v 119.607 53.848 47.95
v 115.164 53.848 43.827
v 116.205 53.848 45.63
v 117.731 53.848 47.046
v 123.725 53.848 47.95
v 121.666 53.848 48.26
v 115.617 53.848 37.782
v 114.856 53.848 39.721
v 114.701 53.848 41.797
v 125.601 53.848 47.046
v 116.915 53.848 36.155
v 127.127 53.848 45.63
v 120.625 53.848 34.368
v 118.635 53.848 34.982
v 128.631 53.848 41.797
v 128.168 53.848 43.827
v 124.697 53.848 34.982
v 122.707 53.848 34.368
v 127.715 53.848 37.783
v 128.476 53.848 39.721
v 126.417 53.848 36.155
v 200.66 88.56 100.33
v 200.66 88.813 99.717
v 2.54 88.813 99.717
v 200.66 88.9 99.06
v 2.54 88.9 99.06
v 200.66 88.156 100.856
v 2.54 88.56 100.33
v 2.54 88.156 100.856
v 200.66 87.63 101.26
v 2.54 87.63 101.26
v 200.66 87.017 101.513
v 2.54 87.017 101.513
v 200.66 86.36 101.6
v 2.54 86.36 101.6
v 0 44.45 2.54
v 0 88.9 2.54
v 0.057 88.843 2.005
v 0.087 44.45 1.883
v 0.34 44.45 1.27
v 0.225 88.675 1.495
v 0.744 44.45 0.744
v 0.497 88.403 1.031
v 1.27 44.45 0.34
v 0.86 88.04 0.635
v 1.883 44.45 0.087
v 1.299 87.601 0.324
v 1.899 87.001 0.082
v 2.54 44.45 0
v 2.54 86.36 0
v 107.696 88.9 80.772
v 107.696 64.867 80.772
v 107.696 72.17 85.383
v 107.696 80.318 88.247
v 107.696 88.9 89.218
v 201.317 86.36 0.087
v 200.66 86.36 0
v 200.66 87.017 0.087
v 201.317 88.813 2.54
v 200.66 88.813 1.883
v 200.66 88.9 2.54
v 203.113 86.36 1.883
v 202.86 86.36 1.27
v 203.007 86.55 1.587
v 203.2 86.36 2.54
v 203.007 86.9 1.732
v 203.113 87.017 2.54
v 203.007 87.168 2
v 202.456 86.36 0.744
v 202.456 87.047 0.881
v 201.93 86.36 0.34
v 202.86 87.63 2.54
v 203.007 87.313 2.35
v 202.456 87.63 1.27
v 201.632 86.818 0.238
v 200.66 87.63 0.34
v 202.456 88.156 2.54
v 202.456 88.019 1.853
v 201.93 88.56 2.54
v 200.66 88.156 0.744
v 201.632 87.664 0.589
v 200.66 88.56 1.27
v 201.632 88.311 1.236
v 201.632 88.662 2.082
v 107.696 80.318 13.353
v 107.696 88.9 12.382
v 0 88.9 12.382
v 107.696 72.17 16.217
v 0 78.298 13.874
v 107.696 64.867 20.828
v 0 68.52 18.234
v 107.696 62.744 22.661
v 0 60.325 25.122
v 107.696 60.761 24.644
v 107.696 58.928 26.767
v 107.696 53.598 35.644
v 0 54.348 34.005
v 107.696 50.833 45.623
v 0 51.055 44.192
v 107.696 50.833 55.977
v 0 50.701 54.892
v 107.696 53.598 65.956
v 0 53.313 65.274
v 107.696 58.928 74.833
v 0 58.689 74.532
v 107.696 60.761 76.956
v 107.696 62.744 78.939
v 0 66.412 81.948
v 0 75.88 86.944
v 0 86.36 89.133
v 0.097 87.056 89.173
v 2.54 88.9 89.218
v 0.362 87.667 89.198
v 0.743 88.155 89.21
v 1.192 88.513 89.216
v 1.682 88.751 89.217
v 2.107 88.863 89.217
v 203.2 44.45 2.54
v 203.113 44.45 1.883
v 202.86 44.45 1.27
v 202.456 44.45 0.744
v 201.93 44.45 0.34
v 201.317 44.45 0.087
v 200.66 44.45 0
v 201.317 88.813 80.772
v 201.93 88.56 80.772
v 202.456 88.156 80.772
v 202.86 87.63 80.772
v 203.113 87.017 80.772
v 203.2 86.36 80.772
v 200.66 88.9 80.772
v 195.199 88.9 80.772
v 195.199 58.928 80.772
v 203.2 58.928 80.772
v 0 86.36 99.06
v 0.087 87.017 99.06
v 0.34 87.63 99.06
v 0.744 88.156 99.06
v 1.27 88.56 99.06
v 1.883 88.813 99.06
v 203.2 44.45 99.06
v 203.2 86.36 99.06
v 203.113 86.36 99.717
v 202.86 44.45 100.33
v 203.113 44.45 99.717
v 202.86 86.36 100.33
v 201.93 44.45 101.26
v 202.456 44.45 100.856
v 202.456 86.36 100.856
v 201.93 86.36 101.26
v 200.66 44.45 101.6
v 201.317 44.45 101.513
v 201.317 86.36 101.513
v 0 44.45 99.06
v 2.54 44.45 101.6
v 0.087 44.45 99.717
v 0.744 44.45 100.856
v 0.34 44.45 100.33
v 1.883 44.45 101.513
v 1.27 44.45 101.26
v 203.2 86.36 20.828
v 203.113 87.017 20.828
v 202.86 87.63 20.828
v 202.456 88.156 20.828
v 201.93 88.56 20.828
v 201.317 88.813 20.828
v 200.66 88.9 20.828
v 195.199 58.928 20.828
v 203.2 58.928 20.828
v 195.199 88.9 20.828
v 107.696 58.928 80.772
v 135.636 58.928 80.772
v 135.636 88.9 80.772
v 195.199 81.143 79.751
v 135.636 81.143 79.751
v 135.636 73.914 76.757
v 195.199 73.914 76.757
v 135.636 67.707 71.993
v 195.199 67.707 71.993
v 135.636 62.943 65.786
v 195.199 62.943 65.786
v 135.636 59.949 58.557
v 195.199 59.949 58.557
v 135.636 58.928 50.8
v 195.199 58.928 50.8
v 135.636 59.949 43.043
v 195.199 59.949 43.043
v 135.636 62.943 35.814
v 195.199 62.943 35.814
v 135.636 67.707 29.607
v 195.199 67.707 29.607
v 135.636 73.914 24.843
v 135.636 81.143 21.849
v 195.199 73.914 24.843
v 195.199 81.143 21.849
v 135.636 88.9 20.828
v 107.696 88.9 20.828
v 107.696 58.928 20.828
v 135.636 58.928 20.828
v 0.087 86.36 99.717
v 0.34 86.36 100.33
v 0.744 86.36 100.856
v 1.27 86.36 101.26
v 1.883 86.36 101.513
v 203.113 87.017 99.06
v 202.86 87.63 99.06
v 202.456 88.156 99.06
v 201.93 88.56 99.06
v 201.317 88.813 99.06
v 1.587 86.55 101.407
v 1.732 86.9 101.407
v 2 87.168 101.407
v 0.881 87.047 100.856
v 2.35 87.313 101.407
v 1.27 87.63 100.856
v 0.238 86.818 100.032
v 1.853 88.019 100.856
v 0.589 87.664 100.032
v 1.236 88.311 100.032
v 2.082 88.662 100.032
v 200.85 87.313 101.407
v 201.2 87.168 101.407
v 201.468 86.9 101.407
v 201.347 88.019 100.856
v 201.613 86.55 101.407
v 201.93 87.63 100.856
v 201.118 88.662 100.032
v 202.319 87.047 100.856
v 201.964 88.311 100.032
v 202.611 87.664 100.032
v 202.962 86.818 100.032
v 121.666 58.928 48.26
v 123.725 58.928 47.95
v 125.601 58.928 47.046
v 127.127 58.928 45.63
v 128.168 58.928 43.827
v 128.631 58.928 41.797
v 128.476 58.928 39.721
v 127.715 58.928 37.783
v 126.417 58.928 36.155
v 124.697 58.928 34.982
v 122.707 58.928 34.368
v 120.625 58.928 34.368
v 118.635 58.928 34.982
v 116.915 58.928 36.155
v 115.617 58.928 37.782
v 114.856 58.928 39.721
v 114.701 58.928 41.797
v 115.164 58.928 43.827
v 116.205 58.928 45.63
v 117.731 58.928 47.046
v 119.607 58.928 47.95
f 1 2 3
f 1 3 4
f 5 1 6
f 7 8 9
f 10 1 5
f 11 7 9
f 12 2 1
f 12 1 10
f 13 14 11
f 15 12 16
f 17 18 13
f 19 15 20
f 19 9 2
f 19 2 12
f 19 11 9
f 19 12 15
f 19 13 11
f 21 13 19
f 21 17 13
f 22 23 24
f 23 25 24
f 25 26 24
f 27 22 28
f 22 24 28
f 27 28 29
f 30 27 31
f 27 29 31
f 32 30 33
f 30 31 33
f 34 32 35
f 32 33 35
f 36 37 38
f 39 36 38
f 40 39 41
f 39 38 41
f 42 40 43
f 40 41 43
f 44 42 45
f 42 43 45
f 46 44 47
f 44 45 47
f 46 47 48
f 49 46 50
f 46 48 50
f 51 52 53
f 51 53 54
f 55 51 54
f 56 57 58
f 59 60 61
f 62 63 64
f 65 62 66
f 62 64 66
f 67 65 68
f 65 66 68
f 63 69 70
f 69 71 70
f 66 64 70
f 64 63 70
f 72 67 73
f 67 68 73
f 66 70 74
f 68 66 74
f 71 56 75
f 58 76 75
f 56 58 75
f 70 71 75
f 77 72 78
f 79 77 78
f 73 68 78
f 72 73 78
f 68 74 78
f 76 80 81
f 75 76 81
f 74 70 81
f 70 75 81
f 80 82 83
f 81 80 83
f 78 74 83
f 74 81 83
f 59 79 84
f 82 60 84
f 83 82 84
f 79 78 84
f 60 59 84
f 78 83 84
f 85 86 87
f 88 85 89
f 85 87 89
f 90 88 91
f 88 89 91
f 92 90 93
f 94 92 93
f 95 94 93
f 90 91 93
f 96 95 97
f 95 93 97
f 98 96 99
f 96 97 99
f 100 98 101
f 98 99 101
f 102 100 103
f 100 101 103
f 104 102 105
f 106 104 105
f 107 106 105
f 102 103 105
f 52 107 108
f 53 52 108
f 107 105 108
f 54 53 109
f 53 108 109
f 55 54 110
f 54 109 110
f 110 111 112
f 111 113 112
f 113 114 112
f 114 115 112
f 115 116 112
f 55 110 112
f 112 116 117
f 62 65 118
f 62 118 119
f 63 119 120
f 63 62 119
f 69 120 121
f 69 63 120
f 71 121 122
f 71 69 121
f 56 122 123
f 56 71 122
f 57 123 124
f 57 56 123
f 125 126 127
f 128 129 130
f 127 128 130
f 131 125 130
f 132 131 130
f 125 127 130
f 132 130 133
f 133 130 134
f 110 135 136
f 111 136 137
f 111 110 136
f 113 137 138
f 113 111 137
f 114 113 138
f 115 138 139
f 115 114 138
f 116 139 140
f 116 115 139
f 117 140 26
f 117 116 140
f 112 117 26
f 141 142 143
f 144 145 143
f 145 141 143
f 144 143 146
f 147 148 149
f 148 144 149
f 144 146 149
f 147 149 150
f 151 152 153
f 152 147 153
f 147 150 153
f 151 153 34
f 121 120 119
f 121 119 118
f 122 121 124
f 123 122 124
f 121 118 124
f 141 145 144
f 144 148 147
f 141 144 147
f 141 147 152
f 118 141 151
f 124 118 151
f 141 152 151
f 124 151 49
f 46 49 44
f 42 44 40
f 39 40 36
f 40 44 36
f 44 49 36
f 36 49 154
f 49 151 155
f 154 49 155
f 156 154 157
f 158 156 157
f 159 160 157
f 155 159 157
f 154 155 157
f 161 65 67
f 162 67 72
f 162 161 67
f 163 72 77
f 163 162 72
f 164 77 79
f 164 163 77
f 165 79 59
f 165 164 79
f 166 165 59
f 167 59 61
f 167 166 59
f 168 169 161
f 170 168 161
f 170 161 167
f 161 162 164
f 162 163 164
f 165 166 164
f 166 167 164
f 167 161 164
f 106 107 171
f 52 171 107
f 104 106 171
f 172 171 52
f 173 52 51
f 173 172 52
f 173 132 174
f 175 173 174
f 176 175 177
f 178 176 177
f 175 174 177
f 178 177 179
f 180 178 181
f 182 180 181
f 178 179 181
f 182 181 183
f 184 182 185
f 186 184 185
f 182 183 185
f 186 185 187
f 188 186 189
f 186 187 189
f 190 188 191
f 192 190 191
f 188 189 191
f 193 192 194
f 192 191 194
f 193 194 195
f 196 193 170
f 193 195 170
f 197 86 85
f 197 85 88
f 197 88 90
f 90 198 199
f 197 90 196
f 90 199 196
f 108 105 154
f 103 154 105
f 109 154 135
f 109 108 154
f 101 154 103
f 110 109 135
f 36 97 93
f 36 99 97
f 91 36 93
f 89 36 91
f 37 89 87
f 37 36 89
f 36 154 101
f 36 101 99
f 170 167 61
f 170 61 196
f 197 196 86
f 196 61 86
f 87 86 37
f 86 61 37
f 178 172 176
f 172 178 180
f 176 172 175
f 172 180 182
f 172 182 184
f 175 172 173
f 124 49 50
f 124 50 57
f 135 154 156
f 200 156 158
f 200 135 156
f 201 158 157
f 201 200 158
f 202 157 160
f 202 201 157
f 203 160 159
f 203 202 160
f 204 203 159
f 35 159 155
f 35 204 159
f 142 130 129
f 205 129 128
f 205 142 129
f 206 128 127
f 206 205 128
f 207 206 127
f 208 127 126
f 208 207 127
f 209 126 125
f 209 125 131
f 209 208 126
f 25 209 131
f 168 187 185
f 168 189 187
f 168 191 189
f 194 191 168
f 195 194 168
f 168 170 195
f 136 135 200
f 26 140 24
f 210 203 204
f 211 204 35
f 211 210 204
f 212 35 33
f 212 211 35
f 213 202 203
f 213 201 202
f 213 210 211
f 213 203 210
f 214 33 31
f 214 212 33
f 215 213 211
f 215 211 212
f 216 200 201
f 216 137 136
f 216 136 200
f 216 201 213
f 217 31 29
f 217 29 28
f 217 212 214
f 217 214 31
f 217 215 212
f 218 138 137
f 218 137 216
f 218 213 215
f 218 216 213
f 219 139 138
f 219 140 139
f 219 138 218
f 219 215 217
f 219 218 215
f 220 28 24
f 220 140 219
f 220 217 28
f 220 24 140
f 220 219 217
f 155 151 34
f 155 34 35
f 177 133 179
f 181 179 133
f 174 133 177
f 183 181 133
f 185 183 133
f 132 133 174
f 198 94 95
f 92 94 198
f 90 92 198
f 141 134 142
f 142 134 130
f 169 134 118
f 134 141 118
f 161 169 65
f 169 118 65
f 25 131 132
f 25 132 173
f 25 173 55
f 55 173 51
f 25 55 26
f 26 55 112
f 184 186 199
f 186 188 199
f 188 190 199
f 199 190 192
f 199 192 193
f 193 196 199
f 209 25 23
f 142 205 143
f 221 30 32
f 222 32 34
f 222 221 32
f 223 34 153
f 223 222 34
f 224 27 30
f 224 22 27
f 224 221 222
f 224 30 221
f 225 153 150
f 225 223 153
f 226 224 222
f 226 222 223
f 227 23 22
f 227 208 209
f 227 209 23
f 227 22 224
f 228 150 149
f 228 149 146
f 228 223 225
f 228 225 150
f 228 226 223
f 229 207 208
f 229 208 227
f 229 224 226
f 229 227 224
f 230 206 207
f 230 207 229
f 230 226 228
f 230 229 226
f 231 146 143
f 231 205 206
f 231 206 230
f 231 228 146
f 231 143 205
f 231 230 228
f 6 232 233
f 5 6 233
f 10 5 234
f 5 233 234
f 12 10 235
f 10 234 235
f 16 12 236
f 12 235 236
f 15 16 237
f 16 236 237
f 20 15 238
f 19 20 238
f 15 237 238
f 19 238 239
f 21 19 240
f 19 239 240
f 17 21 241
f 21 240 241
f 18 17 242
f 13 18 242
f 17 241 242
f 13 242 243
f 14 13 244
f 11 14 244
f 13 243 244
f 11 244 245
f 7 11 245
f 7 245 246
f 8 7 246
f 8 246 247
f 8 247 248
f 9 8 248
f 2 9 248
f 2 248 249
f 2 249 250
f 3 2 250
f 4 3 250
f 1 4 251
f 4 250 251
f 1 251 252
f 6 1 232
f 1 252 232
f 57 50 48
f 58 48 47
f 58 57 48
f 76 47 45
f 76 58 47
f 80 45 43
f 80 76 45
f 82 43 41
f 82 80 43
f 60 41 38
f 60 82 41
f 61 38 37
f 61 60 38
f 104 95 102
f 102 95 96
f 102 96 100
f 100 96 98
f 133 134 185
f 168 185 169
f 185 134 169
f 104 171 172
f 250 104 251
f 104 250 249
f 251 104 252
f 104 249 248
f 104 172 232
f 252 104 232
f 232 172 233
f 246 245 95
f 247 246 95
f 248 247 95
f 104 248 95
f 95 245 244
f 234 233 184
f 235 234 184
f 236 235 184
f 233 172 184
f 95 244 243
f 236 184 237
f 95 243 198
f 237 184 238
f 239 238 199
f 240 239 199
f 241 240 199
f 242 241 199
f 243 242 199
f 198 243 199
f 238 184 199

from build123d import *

# Parameters (mm, degrees)
BOSS_EXTRUDE1_DEPTH = 88.89999999999999
SKETCH2_R           = 29.97200000000001
CUT_EXTRUDE1_DEPTH  = 203.2
CUT_EXTRUDE2_DEPTH  = 8.001
SKETCH4_W           = 59.943999999999946
SKETCH4_H           = 29.972
CUT_EXTRUDE3_DEPTH  = 27.94
SKETCH5_R           = 38.417500000000004
CUT_EXTRUDE4_DEPTH  = 107.696
CUT_EXTRUDE5_DEPTH  = 5.08
SKETCH7_W           = 203.19999999999996
SKETCH7_H           = 6.349999999999999
BOSS_EXTRUDE2_DEPTH = 38.1
FILLET1_R           = 2.54
CUT_EXTRUDE6_DEPTH  = 44.449999999999996


with BuildPart() as part:
    # Sketch1 → Boss-Extrude1 (new body)
    with BuildSketch(Plane(origin=(0, 0, 0), x_dir=(1, 0, 0), z_dir=(0, 1, 0))):
        Polygon((0, 0), (203.2, 0), (203.2, -101.6), (1.244e-14, -101.6), align=None)
    extrude(amount=BOSS_EXTRUDE1_DEPTH)

    # Sketch2 → Cut-Extrude1 (cut)
    with BuildSketch(Plane(origin=(203.2, 0, 0), x_dir=(-2.2e-16, 0, -1), z_dir=(1, 0, -2.2e-16))):
        with Locations((-50.8, 88.89999999999999)):
            Circle(SKETCH2_R)
    extrude(amount=-CUT_EXTRUDE1_DEPTH, mode=Mode.SUBTRACT)

    # Sketch3 → Cut-Extrude2 (cut)
    with BuildSketch(Plane(origin=(203.2, 0, 0), x_dir=(-2.2e-16, 0, -1), z_dir=(1, 0, -2.2e-16))):
        Polygon((-20.82800000000002, 118.87199999999997), (-80.77199999999996, 118.87199999999996), (-80.77199999999996, 58.928000000000004), (-20.828000000000007, 58.928000000000004), align=None)
    extrude(amount=-CUT_EXTRUDE2_DEPTH, mode=Mode.SUBTRACT)

    # Sketch4 → Cut-Extrude3 (cut)
    with BuildSketch(Plane(origin=(135.636, 0, 0), x_dir=(-2.2e-16, 0, -1), z_dir=(1, 0, -2.2e-16))):
        with Locations((-50.800000000000004, 73.914)):
            Rectangle(SKETCH4_W, SKETCH4_H)
    extrude(amount=-CUT_EXTRUDE3_DEPTH, mode=Mode.SUBTRACT)

    # Sketch5 → Cut-Extrude4 (cut)
    with BuildSketch(Plane.ZY):
        with Locations((50.8, 88.89999999999999)):
            Circle(SKETCH5_R)
    extrude(amount=-CUT_EXTRUDE4_DEPTH, mode=Mode.SUBTRACT)

    # Sketch6 → Cut-Extrude5 (cut)
    with BuildSketch(Plane(origin=(0, 58.928000000000004, 0), x_dir=(1, 0, 0), z_dir=(0, 1, 0))):
        with BuildLine():
            ThreePointArc((121.66599999999983, -34.29000000000002), (114.68100000000004, -41.275000000000006), (121.66599999999983, -48.25999999999999))
            Line((121.66600000000003, -48.25999999999999), (121.66600000000003, -34.29000000000002))
        make_face()
        with BuildLine():
            Line((121.66600000000003, -34.29000000000002), (121.66600000000003, -48.25999999999999))
            ThreePointArc((121.66599999999983, -48.25999999999999), (126.60514086658797, -46.214140866588096), (128.651, -41.275000000000006))
            ThreePointArc((128.651, -41.275000000000006), (126.60514086658797, -36.335859133411915), (121.66599999999983, -34.29000000000002))
        make_face()
    extrude(amount=-CUT_EXTRUDE5_DEPTH, mode=Mode.SUBTRACT)

    # Sketch7 → Boss-Extrude2 (add)
    with BuildSketch(Plane.XY.offset(101.6)):
        with Locations((101.59999999999998, 3.1749999999999994)):
            Rectangle(SKETCH7_W, SKETCH7_H)
    extrude(amount=BOSS_EXTRUDE2_DEPTH)

    # Fillet1
    fillet1_edges = [part.edges().sort_by_distance(p)[0] for p in [
        (101.6, 6.35, 101.6),
        (0, 6.35, 120.64999999999999),
        (203.2, 6.35, 120.64999999999999),
        (0, 44.449999999999996, 0),
        (1.168e-14, 88.89999999999999, 95.40875),
        (1.244e-14, 47.625, 101.6),
        (101.6, 88.89999999999999, 0),
        (203.2, 44.449999999999996, 0),
        (203.2, 88.89999999999999, 10.413999999999994),
        (203.2, 88.89999999999999, 91.186),
        (101.6, 88.89999999999999, 101.6),
        (203.2, 47.625, 101.6),
    ]]
    fillet(fillet1_edges, radius=FILLET1_R)

    # Sketch8 → Cut-Extrude6 (cut)
    with BuildSketch(Plane.XZ):
        Polygon((0, 139.7), (203.2, 139.7), (203.20000000000002, -1.73e-15), (1.711e-14, 0), align=None)
    extrude(amount=-CUT_EXTRUDE6_DEPTH, mode=Mode.SUBTRACT)


solid = part.part
